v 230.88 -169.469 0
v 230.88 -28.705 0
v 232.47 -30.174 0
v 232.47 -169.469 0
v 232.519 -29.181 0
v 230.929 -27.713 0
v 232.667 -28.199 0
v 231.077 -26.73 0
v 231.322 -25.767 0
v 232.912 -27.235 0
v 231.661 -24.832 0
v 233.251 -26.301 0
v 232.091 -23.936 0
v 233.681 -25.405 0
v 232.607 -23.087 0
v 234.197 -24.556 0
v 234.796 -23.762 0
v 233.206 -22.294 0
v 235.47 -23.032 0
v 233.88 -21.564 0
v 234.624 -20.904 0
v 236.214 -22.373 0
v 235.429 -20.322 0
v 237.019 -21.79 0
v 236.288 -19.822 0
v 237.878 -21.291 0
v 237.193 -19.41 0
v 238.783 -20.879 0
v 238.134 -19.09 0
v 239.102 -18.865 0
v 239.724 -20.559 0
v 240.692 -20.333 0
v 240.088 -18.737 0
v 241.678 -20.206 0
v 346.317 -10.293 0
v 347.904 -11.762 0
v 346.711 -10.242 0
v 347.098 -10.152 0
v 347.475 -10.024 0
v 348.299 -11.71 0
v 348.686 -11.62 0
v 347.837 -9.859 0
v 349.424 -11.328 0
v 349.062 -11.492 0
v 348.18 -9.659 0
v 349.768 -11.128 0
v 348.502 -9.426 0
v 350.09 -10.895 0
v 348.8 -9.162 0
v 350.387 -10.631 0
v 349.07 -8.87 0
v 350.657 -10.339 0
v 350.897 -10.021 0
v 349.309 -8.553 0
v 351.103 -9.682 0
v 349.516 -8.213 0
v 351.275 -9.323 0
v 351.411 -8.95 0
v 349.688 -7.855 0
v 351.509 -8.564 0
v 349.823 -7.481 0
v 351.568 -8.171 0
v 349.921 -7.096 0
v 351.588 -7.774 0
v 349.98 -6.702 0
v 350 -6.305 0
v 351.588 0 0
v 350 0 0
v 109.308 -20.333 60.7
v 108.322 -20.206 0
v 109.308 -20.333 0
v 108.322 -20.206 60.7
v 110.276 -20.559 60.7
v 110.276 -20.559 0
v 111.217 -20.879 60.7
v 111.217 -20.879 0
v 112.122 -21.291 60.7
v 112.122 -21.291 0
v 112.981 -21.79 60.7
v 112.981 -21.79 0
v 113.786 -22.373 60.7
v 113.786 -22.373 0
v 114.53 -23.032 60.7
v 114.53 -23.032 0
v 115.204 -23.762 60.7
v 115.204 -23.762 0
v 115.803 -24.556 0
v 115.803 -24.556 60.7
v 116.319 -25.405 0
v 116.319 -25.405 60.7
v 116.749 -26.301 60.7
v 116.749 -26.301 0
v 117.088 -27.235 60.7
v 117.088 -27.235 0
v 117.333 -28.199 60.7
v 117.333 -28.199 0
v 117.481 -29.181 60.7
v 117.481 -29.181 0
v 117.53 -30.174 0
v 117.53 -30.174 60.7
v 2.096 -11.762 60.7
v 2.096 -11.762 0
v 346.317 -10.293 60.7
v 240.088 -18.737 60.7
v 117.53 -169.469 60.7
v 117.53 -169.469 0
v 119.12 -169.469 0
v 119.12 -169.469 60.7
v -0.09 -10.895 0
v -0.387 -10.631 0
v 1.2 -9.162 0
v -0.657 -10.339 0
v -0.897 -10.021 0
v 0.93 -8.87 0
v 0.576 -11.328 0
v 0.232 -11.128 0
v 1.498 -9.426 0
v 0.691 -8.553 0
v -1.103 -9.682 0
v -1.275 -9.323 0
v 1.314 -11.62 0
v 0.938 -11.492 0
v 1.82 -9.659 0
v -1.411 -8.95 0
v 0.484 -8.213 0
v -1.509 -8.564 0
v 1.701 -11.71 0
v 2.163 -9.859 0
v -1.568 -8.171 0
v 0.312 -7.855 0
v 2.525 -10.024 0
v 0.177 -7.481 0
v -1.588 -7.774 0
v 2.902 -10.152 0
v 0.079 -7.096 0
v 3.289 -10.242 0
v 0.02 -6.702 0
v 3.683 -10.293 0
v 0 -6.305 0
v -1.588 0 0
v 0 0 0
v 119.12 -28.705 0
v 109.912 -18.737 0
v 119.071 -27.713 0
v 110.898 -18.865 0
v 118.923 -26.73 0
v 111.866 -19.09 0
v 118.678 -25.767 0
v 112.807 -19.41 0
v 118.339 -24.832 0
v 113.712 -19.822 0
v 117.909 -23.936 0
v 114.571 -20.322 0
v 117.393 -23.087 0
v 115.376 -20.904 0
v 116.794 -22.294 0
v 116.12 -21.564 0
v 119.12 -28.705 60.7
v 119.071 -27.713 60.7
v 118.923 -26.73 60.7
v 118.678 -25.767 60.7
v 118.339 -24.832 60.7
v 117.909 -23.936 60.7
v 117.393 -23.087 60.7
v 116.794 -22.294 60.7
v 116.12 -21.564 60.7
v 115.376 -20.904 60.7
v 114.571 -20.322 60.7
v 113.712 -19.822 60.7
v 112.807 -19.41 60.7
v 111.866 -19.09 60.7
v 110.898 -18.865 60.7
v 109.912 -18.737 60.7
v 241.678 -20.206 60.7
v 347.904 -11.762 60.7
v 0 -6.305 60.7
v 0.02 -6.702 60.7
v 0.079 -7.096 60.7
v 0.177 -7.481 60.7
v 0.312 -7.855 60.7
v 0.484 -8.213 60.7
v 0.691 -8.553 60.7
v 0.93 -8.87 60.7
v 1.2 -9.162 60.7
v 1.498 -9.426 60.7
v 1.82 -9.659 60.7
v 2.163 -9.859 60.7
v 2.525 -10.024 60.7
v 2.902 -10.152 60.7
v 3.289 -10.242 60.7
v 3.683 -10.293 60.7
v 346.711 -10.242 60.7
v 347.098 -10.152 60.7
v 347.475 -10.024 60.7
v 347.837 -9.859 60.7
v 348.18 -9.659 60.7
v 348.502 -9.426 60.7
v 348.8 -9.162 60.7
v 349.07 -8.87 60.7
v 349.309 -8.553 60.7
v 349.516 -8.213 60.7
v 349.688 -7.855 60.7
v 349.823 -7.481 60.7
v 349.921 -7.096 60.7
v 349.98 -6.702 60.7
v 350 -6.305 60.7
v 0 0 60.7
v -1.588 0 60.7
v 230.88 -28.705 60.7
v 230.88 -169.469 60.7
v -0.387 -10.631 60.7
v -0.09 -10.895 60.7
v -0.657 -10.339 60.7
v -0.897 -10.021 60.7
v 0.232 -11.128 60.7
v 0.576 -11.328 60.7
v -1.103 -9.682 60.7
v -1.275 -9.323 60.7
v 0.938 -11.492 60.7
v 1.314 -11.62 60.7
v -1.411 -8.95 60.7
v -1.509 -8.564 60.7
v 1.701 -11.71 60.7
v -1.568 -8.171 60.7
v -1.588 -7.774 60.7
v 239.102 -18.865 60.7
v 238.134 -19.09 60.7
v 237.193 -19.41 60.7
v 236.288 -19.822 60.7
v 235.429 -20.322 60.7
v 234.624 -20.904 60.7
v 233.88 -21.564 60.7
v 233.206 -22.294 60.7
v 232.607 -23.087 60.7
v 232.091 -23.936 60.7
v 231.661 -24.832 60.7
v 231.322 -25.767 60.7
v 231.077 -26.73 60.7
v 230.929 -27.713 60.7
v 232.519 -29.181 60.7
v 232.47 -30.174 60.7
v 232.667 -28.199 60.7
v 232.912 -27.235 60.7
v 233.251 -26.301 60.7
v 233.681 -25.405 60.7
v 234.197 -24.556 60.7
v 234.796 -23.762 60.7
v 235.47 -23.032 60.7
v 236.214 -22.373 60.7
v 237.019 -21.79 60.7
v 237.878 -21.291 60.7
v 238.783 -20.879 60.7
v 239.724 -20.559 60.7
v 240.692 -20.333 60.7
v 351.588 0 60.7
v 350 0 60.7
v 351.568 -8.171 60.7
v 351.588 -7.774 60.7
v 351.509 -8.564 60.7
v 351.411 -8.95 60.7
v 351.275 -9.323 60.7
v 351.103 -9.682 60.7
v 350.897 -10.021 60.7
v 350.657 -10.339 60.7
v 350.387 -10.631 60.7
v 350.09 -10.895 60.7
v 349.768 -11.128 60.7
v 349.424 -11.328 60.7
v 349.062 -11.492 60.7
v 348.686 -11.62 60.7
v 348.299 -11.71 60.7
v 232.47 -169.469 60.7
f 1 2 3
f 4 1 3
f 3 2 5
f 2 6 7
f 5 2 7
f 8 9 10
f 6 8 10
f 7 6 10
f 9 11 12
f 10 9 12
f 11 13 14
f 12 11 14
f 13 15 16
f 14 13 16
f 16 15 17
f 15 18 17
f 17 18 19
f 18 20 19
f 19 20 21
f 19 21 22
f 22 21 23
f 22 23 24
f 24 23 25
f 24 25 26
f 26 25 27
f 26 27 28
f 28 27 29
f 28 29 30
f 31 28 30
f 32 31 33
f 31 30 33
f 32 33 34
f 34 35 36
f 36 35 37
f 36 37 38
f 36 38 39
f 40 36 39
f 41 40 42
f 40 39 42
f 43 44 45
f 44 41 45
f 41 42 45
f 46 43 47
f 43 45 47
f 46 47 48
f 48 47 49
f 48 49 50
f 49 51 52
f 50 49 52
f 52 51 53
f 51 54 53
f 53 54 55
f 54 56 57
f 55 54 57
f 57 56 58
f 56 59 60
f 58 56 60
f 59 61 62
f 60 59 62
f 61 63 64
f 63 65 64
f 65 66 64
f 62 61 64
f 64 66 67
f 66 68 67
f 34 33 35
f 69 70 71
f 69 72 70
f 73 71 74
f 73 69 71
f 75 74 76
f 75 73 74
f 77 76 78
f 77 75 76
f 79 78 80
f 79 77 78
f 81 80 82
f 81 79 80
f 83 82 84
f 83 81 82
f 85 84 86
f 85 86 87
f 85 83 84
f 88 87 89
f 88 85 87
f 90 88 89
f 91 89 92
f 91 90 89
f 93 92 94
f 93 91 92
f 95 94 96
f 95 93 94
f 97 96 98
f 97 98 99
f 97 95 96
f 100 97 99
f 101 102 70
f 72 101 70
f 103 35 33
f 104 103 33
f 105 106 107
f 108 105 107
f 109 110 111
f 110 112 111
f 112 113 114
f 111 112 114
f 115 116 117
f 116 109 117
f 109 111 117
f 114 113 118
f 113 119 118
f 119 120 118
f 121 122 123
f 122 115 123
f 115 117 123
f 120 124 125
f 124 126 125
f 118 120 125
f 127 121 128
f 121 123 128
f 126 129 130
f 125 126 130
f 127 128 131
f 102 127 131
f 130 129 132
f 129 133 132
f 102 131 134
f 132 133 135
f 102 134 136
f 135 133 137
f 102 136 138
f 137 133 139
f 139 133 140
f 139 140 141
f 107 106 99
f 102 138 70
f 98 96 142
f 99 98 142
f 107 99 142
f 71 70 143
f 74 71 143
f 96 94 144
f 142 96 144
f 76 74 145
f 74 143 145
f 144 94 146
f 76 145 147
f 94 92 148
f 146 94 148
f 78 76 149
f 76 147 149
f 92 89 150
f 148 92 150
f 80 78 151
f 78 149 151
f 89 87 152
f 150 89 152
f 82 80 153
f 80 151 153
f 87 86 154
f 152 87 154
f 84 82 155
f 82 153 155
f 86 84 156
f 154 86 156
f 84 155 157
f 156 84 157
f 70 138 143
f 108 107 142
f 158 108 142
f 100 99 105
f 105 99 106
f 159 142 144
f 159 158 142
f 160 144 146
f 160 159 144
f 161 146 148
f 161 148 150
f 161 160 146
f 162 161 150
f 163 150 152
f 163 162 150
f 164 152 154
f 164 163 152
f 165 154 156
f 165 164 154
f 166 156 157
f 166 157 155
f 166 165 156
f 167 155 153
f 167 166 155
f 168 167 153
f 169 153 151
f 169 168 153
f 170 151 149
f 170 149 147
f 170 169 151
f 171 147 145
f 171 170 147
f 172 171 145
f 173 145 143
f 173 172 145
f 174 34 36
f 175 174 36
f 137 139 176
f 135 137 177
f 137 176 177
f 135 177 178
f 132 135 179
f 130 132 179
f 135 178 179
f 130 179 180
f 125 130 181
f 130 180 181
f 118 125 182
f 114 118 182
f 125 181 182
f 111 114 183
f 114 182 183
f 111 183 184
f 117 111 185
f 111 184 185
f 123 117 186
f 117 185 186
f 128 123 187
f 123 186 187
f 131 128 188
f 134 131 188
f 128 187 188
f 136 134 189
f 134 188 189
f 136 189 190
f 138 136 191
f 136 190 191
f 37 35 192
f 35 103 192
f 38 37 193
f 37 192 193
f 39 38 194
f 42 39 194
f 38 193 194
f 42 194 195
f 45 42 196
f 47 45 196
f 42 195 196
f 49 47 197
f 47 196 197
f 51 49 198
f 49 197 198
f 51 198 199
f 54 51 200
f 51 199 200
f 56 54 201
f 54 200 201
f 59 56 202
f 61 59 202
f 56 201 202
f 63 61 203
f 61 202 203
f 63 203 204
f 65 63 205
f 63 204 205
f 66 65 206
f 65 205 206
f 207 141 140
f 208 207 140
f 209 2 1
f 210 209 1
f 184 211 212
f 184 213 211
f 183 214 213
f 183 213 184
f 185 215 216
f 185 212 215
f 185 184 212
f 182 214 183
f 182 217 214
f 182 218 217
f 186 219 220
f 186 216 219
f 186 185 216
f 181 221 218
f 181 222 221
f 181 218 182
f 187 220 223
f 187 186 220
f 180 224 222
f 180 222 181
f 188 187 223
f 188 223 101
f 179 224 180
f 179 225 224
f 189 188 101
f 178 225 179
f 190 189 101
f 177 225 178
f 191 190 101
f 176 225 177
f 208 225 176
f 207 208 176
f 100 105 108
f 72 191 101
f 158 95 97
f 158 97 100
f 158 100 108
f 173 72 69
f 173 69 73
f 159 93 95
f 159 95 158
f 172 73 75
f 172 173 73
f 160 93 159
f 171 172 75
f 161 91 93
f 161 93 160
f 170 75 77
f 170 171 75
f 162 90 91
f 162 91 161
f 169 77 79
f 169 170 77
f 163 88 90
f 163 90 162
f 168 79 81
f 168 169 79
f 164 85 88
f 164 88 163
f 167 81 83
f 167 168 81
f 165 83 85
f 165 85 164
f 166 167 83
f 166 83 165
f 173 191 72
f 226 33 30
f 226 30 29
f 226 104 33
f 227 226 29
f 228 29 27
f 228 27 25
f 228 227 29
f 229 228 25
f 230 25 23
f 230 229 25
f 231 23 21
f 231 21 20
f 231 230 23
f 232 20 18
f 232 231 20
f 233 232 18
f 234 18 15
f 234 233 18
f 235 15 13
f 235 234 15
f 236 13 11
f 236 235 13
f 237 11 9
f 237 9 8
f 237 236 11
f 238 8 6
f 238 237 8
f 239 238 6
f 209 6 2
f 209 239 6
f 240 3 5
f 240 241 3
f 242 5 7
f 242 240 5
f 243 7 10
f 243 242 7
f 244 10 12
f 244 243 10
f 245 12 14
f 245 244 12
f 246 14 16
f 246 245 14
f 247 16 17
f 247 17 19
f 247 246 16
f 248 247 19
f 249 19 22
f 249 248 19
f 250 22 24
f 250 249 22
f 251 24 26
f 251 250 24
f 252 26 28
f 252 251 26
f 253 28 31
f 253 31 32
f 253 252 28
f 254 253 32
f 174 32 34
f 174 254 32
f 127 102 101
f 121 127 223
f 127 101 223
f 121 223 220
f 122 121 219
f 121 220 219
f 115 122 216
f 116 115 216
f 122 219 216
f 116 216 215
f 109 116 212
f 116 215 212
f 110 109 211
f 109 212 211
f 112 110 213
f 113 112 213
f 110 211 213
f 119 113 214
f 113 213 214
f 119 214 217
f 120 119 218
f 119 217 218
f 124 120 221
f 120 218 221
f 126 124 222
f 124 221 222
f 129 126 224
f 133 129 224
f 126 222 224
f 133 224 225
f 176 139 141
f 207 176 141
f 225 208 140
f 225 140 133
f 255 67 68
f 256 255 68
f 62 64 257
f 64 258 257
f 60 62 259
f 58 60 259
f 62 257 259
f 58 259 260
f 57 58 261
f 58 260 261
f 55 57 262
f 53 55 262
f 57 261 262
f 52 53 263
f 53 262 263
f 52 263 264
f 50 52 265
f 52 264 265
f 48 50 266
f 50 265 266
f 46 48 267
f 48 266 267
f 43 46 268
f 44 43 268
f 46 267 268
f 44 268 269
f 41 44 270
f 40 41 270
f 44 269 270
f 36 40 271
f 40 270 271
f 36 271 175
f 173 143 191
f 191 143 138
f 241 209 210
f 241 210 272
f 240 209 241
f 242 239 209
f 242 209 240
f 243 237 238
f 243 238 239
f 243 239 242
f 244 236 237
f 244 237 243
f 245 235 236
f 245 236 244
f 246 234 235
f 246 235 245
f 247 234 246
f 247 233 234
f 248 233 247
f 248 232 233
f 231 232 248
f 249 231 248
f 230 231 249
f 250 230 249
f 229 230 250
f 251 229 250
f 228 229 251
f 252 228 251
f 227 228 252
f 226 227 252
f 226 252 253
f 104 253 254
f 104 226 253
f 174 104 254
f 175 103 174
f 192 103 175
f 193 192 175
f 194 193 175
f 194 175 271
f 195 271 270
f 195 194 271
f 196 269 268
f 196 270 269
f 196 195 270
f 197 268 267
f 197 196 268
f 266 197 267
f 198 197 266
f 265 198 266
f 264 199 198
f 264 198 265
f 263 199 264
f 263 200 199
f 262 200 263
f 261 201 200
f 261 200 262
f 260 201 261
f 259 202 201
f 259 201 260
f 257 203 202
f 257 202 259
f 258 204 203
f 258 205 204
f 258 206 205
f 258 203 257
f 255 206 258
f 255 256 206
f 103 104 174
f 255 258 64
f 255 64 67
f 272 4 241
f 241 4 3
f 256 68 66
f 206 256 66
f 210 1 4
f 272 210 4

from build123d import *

# Parameters (mm, degrees)
BOSS_EXTRUDE1_DEPTH   = 60.7
BOSS_EXTRUDE1_2_DEPTH = 60.7
FILLET1_R             = 10
FILLET2_R             = 10
FILLET3_R             = 4
FILLET4_R             = 4


with BuildPart() as part:
    # Sketch1 → Boss-Extrude1 (new body)
    with BuildSketch(Plane.XY):
        Polygon((350, -10), (230.88, -19.468825337), (230.88, -169.468825337), (232.47, -169.468825337), (232.47, -20.93745195), (351.5875, -11.468825337), (351.5875, 0), (350, 0), align=None)
    extrude(amount=BOSS_EXTRUDE1_DEPTH)

    # Fillet1
    fillet1_edges = [part.edges().sort_by_distance(p)[0] for p in [
        (232.47, -20.93745195, 30.35),
        (230.88, -19.468825337, 30.35),
    ]]
    fillet(fillet1_edges, radius=FILLET1_R)

    # Fillet3
    fillet3_edges = [part.edges().sort_by_distance(p)[0] for p in [
        (351.5875, -11.468825337, 30.35),
        (350, -10, 30.35),
    ]]
    fillet(fillet3_edges, radius=FILLET3_R)


with BuildPart() as body_2:
    # Sketch1 → Boss-Extrude1 2 (new body)
    with BuildSketch(Plane.XY):
        Polygon((0, 0), (-1.5875, 0), (-1.5875, -11.468825337), (117.53, -20.93745195), (117.53, -169.468825337), (119.12, -169.468825337), (119.12, -19.468825337), (0, -10), align=None)
    extrude(amount=BOSS_EXTRUDE1_2_DEPTH)

    # Fillet2
    fillet2_edges = [body_2.edges().sort_by_distance(p)[0] for p in [
        (119.12, -19.468825337, 30.35),
        (117.53, -20.93745195, 30.35),
    ]]
    fillet(fillet2_edges, radius=FILLET2_R)

    # Fillet4
    fillet4_edges = [body_2.edges().sort_by_distance(p)[0] for p in [
        (0, -10, 30.35),
        (-1.5875, -11.468825337, 30.35),
    ]]
    fillet(fillet4_edges, radius=FILLET4_R)


solid = Compound([part.part, body_2.part])
